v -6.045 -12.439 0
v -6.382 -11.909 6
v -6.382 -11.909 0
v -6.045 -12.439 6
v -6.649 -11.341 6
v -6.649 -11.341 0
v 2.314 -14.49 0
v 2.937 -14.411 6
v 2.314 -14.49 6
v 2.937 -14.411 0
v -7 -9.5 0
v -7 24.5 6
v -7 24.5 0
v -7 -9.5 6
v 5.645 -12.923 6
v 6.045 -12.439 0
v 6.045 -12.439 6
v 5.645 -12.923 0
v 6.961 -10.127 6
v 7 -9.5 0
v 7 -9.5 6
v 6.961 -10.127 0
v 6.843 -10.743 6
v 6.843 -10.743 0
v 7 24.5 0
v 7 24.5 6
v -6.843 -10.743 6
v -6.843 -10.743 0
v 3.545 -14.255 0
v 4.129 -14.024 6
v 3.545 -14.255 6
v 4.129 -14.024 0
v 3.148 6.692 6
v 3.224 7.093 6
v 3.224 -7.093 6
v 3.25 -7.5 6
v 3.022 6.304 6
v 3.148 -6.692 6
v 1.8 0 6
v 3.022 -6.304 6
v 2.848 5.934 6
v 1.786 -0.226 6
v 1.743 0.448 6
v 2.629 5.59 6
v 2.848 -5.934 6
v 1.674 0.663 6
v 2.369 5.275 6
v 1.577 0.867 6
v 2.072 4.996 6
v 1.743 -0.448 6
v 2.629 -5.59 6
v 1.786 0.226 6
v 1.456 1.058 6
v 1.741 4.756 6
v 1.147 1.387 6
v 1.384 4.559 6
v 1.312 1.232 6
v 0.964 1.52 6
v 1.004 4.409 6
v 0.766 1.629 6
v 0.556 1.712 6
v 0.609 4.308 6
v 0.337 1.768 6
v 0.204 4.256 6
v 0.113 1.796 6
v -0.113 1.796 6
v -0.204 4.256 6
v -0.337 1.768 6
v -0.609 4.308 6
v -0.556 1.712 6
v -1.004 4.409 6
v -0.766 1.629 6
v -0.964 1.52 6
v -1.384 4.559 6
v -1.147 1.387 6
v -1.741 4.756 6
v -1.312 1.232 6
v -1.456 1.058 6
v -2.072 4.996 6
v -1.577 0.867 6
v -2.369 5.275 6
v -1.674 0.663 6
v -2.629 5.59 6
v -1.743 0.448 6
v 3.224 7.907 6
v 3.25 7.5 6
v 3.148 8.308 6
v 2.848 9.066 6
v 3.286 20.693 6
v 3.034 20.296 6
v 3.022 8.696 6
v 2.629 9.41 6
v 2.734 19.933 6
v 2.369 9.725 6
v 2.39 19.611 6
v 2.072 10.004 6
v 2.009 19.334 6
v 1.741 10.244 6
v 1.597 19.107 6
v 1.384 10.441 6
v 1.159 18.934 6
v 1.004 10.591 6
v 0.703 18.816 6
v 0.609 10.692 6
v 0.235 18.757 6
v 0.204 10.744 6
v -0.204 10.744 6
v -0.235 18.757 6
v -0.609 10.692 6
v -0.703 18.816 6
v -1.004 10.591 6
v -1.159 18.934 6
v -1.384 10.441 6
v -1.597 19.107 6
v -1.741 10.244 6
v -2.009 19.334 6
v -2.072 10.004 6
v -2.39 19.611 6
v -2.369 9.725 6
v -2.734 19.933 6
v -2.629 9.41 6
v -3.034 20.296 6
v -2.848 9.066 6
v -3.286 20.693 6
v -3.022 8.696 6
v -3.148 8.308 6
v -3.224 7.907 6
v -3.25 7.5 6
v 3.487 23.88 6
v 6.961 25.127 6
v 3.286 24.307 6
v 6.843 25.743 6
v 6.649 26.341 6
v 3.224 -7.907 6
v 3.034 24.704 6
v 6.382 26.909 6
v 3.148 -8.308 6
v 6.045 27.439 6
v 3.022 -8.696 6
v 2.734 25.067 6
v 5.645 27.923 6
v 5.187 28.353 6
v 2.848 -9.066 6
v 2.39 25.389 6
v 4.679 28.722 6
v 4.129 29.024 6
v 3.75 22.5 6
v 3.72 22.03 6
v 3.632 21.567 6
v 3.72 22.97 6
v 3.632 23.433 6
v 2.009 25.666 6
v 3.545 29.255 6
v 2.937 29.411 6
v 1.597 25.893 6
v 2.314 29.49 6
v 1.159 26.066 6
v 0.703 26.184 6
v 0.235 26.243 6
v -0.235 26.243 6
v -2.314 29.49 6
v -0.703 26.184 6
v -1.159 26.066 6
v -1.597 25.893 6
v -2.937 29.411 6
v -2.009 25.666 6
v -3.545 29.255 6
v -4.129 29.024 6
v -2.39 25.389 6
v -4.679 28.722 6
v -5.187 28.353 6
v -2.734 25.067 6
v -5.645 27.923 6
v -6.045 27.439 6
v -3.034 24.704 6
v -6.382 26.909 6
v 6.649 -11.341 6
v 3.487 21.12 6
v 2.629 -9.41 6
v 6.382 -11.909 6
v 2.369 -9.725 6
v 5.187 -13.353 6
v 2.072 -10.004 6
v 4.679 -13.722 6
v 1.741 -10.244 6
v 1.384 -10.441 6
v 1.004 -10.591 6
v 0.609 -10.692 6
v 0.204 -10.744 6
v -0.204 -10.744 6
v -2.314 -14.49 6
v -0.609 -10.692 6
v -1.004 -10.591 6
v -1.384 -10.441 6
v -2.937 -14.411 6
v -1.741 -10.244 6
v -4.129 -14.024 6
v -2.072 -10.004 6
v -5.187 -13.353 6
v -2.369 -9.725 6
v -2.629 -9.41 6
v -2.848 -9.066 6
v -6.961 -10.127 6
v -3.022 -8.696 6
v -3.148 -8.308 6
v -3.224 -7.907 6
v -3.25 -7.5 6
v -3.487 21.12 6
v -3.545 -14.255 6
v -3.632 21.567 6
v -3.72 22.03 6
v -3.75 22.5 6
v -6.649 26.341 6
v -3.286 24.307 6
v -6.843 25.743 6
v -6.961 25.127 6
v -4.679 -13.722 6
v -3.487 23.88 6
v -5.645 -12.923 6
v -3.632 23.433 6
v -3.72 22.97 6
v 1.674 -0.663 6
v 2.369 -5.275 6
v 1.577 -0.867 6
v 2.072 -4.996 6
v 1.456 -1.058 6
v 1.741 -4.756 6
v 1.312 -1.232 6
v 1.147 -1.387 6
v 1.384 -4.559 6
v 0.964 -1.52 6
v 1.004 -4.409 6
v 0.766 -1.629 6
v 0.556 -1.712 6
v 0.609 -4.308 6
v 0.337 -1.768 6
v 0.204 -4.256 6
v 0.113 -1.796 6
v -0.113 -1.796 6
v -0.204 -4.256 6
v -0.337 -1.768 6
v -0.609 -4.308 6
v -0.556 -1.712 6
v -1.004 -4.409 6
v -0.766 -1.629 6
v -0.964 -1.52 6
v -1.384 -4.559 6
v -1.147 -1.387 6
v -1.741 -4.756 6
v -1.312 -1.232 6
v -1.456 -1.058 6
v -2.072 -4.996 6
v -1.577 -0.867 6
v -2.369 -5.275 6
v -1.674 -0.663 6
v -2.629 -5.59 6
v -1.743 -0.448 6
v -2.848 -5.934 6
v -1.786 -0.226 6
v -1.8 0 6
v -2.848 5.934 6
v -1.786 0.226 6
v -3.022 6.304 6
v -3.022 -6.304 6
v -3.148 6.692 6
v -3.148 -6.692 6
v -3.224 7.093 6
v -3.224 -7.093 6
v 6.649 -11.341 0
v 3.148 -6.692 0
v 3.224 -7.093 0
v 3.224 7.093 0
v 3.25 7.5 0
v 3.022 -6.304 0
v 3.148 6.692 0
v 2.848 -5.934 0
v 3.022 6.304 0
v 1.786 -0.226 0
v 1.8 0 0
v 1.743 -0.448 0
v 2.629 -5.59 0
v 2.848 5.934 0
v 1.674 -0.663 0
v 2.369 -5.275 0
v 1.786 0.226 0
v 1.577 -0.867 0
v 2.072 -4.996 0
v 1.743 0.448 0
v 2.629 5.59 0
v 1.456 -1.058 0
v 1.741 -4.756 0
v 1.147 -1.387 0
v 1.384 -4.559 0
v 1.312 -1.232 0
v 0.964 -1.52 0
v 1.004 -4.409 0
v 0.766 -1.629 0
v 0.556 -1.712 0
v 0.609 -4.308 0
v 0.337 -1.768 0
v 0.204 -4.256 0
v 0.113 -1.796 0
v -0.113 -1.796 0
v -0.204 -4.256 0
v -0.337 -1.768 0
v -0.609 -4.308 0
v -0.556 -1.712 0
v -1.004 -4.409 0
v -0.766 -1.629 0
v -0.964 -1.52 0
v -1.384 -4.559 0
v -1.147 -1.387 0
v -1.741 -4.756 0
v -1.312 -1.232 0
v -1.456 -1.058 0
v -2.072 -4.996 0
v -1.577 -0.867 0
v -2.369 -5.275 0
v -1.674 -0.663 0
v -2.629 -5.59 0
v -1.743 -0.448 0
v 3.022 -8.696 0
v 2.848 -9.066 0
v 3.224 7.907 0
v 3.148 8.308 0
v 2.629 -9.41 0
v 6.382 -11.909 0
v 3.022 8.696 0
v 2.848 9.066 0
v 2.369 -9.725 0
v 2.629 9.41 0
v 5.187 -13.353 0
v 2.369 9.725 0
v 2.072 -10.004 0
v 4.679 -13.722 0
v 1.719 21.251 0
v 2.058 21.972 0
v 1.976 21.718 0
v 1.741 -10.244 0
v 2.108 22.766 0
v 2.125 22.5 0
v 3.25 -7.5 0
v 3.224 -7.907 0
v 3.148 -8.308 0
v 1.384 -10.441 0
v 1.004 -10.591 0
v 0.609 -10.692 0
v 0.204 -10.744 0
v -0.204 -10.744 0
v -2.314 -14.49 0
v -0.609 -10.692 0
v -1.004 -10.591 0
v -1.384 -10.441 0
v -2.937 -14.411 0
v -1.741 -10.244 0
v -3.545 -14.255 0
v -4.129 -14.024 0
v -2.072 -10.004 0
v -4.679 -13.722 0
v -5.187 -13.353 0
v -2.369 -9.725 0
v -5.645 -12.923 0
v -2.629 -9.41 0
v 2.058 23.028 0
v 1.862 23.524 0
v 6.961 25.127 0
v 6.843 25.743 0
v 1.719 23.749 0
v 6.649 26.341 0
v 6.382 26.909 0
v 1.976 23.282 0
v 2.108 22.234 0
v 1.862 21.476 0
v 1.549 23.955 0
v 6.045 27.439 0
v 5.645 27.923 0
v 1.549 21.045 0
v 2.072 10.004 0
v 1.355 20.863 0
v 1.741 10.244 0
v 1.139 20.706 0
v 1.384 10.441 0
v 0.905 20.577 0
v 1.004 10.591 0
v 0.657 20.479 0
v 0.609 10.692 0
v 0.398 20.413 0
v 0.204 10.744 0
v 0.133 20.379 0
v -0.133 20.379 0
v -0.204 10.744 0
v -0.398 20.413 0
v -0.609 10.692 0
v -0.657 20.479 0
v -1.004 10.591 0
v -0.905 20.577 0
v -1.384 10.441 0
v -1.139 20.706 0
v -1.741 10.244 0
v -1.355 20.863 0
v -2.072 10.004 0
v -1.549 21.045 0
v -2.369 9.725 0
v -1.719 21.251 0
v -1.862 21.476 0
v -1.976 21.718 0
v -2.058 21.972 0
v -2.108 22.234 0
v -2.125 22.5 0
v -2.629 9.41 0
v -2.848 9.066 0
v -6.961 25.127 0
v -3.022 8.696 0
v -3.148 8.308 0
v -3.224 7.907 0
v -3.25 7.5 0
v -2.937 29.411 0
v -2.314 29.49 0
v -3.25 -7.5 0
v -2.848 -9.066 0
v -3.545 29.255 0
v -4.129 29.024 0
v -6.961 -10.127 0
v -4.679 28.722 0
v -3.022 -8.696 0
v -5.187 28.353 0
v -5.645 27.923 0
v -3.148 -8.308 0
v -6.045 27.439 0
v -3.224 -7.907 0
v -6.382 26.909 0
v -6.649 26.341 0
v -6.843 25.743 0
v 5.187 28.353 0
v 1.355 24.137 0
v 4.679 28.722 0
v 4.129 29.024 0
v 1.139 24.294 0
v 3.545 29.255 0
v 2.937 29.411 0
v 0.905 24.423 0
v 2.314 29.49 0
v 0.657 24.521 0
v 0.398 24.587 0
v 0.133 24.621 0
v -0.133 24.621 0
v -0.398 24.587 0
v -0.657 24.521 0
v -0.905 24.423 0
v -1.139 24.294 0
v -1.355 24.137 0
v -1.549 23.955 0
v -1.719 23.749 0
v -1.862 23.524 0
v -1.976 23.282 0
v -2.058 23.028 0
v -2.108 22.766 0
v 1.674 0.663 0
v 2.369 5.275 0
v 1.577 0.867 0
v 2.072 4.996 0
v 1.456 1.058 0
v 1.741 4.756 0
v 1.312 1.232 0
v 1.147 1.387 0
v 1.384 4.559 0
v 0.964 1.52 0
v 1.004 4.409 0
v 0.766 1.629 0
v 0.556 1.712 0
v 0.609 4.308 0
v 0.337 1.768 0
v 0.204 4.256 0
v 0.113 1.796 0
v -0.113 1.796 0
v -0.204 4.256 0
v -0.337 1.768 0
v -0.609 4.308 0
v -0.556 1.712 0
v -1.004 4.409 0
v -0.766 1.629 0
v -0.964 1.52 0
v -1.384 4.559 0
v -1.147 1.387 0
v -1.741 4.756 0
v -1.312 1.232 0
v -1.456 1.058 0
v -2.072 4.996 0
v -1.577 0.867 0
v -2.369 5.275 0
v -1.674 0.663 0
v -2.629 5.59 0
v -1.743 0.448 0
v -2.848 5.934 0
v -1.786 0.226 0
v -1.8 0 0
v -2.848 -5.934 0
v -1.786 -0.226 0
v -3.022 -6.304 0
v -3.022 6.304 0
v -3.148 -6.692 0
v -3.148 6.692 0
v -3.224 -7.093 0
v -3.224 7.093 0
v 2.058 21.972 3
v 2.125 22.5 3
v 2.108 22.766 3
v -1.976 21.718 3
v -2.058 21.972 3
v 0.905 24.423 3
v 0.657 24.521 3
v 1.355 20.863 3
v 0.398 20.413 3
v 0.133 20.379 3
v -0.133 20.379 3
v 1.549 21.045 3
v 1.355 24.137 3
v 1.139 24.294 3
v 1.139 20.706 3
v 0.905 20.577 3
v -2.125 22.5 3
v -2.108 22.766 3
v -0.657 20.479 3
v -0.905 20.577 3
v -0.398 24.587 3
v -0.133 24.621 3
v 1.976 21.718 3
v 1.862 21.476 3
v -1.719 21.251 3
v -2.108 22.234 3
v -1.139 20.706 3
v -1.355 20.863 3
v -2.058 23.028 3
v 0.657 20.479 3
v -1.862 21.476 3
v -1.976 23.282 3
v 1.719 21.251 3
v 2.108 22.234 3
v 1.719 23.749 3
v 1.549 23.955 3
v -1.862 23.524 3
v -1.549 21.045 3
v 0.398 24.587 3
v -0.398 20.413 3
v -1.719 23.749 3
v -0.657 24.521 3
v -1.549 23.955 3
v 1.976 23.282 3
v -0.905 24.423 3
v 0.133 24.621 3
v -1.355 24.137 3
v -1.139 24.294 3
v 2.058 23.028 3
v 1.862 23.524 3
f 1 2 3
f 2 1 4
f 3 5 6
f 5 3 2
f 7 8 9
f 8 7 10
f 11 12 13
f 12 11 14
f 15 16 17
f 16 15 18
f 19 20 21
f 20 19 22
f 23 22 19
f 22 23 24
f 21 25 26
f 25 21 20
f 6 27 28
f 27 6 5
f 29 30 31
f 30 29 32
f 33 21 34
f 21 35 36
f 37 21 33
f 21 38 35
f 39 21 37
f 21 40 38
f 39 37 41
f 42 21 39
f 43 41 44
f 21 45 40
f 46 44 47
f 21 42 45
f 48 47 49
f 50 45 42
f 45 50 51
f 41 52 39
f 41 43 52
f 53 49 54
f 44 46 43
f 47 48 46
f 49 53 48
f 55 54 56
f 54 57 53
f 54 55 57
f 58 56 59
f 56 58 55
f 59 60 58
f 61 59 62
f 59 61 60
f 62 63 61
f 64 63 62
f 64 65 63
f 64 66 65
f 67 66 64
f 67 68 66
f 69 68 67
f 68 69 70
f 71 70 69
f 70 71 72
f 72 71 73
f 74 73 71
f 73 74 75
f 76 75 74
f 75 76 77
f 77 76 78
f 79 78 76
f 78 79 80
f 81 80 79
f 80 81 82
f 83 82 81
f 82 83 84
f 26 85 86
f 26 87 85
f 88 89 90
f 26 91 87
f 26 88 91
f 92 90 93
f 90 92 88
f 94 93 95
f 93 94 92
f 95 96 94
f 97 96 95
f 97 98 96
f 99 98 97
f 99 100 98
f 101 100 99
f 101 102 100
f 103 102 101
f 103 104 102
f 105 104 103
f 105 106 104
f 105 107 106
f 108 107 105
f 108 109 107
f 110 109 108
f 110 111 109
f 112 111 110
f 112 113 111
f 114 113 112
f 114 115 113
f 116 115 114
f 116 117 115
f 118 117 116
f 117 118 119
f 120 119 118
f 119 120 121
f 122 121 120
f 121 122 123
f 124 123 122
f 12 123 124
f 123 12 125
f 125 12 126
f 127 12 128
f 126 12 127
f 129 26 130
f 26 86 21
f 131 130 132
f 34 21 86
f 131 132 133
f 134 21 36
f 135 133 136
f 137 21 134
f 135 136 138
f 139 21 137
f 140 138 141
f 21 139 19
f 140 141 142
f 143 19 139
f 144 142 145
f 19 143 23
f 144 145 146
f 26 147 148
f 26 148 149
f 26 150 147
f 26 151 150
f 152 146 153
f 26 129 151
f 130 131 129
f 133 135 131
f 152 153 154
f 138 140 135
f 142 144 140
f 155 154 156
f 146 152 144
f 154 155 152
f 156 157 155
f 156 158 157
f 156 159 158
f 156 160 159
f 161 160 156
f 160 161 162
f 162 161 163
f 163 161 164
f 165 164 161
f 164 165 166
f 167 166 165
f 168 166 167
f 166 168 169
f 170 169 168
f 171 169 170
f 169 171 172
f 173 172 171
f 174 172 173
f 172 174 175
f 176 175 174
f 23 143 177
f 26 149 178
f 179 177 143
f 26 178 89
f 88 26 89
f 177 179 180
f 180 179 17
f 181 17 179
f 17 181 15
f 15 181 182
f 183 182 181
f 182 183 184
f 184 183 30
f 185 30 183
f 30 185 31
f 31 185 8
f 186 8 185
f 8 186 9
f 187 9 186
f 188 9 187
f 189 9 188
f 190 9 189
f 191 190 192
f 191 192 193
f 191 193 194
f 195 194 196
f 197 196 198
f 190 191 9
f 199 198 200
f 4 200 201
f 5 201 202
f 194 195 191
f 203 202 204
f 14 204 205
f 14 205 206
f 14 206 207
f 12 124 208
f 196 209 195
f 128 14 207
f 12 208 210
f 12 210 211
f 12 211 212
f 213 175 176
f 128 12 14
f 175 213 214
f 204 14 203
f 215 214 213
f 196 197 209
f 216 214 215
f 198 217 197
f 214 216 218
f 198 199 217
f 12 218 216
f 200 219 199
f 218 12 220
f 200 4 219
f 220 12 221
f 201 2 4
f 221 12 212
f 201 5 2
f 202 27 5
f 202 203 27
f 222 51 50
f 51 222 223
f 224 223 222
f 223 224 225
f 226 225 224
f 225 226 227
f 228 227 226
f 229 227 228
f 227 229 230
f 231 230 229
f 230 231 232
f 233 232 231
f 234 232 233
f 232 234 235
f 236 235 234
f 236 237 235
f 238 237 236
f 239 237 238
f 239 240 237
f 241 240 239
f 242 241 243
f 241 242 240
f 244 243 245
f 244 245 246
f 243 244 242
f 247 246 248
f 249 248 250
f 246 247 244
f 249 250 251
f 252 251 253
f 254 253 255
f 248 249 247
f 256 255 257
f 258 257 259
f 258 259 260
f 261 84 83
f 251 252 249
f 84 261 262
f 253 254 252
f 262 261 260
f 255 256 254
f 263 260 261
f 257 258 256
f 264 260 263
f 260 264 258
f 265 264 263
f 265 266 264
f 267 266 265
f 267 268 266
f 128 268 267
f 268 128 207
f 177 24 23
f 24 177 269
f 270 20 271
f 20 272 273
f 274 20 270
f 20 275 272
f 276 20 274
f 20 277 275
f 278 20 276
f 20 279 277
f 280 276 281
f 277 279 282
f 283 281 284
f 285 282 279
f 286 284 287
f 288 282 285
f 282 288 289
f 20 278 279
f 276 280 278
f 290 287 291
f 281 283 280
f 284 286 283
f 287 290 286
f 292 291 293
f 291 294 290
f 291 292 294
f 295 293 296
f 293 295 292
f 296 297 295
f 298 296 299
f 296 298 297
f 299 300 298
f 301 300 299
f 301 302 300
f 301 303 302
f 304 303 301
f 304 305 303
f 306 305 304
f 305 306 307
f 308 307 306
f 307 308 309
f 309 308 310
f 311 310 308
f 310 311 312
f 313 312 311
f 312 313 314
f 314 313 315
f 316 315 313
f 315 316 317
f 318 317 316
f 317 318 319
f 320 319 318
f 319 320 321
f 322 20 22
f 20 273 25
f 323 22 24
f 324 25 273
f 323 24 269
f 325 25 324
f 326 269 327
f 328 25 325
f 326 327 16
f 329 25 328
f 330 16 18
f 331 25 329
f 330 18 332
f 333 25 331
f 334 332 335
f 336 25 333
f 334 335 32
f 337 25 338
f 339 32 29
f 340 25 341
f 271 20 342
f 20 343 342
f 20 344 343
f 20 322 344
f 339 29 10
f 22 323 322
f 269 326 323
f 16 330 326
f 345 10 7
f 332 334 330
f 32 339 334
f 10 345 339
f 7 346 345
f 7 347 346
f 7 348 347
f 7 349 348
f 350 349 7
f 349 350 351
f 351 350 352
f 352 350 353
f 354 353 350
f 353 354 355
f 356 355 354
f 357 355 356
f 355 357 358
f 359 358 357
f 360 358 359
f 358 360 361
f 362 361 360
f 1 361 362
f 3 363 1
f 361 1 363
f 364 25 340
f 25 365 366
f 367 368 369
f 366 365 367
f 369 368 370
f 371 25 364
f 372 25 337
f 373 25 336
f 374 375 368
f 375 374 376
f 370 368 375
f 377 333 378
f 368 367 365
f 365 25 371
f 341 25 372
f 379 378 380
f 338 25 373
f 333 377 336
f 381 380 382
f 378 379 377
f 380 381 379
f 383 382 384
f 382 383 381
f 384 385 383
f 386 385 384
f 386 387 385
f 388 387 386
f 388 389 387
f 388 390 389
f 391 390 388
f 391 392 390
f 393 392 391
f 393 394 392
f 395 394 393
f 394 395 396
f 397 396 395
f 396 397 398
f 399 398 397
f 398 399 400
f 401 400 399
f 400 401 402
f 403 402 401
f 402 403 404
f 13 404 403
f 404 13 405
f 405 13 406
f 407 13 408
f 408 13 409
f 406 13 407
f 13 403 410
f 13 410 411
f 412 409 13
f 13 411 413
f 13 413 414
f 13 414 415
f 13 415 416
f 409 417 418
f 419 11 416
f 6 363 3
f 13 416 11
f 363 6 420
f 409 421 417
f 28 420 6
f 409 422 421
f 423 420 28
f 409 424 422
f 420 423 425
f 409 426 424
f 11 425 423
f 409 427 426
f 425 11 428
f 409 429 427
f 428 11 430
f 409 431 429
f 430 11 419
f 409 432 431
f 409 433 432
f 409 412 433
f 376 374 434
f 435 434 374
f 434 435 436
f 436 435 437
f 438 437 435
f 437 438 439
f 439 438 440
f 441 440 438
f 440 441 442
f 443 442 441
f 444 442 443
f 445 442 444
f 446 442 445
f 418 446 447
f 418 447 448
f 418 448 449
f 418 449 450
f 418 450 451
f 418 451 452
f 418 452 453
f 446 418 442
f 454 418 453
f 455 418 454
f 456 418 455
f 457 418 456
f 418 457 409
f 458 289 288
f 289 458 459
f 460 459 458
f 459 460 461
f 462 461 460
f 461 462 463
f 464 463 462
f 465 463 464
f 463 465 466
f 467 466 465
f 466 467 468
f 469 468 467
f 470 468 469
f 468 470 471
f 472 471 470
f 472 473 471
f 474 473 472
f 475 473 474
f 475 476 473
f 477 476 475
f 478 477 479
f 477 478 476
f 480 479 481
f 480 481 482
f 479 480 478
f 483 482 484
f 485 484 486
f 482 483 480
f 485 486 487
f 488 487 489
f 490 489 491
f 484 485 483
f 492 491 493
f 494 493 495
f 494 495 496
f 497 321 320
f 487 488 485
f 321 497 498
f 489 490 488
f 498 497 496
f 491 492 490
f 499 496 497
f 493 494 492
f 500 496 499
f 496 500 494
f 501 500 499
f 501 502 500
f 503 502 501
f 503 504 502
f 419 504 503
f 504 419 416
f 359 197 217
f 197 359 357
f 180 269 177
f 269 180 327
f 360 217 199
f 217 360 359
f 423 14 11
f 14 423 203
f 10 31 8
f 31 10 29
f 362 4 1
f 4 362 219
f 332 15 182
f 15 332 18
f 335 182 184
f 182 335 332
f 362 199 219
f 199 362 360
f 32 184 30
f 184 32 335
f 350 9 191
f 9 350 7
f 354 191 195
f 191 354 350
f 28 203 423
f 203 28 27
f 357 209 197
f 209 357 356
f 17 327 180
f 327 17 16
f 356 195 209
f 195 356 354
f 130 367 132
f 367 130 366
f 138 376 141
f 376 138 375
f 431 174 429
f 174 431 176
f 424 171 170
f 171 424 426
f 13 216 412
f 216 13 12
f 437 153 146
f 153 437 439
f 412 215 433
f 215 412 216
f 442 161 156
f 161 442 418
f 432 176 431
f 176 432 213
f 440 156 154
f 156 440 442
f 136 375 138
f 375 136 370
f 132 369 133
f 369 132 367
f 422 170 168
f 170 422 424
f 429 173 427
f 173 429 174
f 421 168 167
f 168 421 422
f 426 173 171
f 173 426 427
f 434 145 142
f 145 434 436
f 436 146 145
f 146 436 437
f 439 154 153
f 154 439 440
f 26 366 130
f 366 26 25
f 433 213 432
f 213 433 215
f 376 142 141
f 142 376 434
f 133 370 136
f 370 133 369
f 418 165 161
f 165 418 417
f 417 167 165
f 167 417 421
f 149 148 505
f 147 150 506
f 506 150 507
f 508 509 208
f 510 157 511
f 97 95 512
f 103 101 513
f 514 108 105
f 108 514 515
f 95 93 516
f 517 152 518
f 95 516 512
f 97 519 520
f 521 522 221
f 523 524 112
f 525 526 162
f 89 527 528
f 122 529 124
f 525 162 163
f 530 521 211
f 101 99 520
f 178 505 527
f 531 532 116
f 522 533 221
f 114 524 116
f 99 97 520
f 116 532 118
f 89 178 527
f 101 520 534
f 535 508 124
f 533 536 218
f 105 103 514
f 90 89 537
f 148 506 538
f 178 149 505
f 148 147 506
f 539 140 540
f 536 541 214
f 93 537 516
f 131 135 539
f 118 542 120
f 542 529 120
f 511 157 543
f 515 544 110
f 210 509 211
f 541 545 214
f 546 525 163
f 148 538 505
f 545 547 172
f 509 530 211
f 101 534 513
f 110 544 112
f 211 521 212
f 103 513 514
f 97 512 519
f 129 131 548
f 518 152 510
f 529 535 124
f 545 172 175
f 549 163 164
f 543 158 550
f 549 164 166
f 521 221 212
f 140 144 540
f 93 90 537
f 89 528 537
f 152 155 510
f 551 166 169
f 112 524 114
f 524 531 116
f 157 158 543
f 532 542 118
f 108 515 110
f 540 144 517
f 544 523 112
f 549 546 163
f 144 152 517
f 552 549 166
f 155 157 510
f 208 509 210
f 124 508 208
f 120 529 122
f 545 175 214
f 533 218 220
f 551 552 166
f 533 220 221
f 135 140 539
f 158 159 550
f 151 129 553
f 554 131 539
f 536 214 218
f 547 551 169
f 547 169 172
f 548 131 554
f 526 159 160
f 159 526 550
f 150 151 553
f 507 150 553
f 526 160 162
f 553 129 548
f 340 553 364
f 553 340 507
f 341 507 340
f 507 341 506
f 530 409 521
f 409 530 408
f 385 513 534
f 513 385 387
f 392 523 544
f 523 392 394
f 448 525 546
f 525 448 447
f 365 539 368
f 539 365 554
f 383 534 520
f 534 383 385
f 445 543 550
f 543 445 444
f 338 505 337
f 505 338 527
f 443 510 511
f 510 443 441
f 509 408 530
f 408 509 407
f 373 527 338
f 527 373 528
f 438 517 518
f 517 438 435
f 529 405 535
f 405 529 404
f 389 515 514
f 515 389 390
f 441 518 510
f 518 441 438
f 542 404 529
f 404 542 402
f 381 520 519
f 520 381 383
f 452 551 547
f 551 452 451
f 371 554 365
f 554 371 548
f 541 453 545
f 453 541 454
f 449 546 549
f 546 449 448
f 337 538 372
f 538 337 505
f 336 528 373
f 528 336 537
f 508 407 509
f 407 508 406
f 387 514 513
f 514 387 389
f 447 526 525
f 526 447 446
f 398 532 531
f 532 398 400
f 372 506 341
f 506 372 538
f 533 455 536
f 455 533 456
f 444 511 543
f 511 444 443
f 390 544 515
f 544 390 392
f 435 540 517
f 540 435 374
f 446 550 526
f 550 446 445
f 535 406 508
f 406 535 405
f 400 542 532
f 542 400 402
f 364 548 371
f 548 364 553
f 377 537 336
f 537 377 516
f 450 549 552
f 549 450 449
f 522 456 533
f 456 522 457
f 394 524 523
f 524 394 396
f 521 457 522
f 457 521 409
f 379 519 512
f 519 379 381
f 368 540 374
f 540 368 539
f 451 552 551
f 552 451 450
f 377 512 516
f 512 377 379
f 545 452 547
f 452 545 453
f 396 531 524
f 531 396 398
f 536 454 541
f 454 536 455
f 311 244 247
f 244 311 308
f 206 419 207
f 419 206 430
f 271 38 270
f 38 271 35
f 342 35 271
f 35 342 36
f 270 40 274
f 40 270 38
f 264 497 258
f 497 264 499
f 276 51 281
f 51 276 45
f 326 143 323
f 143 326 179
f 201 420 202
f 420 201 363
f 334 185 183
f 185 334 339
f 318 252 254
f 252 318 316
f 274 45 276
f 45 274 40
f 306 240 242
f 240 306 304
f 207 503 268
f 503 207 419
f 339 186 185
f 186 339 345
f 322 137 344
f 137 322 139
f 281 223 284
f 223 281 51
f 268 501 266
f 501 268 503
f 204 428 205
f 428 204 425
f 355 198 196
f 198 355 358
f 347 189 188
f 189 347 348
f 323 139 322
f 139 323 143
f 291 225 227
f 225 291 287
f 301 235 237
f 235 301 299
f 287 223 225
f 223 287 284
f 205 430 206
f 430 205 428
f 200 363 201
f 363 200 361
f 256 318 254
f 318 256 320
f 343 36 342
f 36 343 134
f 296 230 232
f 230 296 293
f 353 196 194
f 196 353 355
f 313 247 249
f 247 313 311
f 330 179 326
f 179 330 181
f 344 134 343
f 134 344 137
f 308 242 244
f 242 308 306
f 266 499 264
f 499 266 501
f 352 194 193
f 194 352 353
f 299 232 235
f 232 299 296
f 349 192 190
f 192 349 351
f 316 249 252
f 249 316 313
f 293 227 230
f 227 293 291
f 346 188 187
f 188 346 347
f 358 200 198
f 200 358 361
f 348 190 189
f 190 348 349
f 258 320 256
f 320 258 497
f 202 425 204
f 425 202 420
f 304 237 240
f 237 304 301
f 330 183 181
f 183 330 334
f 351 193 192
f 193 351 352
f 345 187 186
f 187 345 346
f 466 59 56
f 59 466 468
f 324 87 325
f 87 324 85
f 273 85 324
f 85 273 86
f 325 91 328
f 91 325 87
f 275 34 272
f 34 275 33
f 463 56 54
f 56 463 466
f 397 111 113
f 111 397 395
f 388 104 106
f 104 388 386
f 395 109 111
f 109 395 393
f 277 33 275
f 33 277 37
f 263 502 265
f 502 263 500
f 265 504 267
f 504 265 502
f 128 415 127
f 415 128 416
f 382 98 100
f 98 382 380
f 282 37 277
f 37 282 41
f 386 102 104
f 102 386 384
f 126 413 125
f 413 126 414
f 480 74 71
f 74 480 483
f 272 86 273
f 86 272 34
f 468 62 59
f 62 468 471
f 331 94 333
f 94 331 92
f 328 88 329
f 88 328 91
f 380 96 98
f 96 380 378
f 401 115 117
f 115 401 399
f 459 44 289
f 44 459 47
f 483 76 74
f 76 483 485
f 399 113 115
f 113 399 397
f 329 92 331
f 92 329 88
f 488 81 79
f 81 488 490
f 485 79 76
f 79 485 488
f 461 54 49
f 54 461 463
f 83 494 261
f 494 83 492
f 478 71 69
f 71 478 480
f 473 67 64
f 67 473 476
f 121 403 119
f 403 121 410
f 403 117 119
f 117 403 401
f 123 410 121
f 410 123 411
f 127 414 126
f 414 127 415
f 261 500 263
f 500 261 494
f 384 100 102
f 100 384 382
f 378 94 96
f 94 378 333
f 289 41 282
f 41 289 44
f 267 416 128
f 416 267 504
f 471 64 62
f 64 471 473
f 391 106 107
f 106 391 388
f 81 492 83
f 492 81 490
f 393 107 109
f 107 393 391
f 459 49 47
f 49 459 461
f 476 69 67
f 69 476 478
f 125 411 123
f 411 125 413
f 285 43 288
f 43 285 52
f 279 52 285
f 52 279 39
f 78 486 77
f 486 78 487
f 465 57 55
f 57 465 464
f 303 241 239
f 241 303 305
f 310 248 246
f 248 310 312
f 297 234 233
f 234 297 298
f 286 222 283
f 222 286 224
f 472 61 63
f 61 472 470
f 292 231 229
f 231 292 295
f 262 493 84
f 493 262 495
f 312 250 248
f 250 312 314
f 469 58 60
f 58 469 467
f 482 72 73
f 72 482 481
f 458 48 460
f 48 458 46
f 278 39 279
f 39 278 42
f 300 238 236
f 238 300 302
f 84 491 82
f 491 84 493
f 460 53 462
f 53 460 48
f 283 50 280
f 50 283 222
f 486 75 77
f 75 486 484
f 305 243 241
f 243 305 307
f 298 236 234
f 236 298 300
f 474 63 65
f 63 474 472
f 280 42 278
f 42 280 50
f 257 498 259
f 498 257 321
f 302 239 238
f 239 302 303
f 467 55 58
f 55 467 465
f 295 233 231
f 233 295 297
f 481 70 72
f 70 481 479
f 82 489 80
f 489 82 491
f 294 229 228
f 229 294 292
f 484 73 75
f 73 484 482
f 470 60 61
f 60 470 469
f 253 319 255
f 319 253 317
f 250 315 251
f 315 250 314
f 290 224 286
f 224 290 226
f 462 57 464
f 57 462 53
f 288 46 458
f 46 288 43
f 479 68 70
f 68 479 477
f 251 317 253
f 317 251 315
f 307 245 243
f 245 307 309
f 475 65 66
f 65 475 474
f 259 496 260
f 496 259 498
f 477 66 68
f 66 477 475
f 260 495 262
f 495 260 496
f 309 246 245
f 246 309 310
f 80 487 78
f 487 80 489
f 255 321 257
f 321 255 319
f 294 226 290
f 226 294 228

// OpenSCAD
$fn = 50;


difference() {
	union() {
		hull() {
			translate(v = [-2.0000000000, 9.5000000000, 0]) {
				cylinder(h = 6, r = 5);
			}
			translate(v = [2.0000000000, 9.5000000000, 0]) {
				cylinder(h = 6, r = 5);
			}
			translate(v = [-2.0000000000, -9.5000000000, 0]) {
				cylinder(h = 6, r = 5);
			}
			translate(v = [2.0000000000, -9.5000000000, 0]) {
				cylinder(h = 6, r = 5);
			}
		}
		translate(v = [0.0000000000, 15.0000000000, 0]) {
			hull() {
				translate(v = [-2.0000000000, 9.5000000000, 0]) {
					cylinder(h = 6, r = 5);
				}
				translate(v = [2.0000000000, 9.5000000000, 0]) {
					cylinder(h = 6, r = 5);
				}
				translate(v = [-2.0000000000, -9.5000000000, 0]) {
					cylinder(h = 6, r = 5);
				}
				translate(v = [2.0000000000, -9.5000000000, 0]) {
					cylinder(h = 6, r = 5);
				}
			}
		}
		translate(v = [0.0000000000, 15.0000000000, 0]) {
			hull() {
				translate(v = [-2.0000000000, 9.5000000000, 0]) {
					cylinder(h = 6, r = 5);
				}
				translate(v = [2.0000000000, 9.5000000000, 0]) {
					cylinder(h = 6, r = 5);
				}
				translate(v = [-2.0000000000, -9.5000000000, 0]) {
					cylinder(h = 6, r = 5);
				}
				translate(v = [2.0000000000, -9.5000000000, 0]) {
					cylinder(h = 6, r = 5);
				}
			}
		}
	}
	union() {
		translate(v = [0.0000000000, 22.5000000000, 6]) {
			rotate(a = [0, 0, 0]) {
				difference() {
					union() {
						#translate(v = [0, 0, -6.0000000000]) {
							cylinder(h = 6, r = 2.0000000000);
						}
						#translate(v = [0, 0, -3]) {
							cylinder(h = 3, r1 = 2.1250000000, r2 = 3.7500000000);
						}
						#translate(v = [0, 0, -6.0000000000]) {
							cylinder(h = 6, r = 2.1250000000);
						}
						#translate(v = [0, 0, -6.0000000000]) {
							cylinder(h = 6, r = 2.0000000000);
						}
					}
					union();
				}
			}
		}
		translate(v = [0.0000000000, 22.5000000000, 6]) {
			rotate(a = [0, 0, 0]) {
				difference() {
					union() {
						#translate(v = [0, 0, -6.0000000000]) {
							cylinder(h = 6, r = 2.0000000000);
						}
						#translate(v = [0, 0, -3]) {
							cylinder(h = 3, r1 = 2.1250000000, r2 = 3.7500000000);
						}
						#translate(v = [0, 0, -6.0000000000]) {
							cylinder(h = 6, r = 2.1250000000);
						}
						#translate(v = [0, 0, -6.0000000000]) {
							cylinder(h = 6, r = 2.0000000000);
						}
					}
					union();
				}
			}
		}
		translate(v = [0.0000000000, -7.5000000000, 0]) {
			translate(v = [0, 0, -100]) {
				cylinder(h = 200, r = 3.2500000000);
			}
		}
		translate(v = [0.0000000000, 7.5000000000, 0]) {
			translate(v = [0, 0, -100]) {
				cylinder(h = 200, r = 3.2500000000);
			}
		}
		translate(v = [0.0000000000, -7.5000000000, 0]) {
			translate(v = [0, 0, -100]) {
				cylinder(h = 200, r = 1.8000000000);
			}
		}
		translate(v = [0, 0, -100]) {
			cylinder(h = 200, r = 1.8000000000);
		}
		translate(v = [0.0000000000, 7.5000000000, 0]) {
			translate(v = [0, 0, -100]) {
				cylinder(h = 200, r = 1.8000000000);
			}
		}
	}
}
